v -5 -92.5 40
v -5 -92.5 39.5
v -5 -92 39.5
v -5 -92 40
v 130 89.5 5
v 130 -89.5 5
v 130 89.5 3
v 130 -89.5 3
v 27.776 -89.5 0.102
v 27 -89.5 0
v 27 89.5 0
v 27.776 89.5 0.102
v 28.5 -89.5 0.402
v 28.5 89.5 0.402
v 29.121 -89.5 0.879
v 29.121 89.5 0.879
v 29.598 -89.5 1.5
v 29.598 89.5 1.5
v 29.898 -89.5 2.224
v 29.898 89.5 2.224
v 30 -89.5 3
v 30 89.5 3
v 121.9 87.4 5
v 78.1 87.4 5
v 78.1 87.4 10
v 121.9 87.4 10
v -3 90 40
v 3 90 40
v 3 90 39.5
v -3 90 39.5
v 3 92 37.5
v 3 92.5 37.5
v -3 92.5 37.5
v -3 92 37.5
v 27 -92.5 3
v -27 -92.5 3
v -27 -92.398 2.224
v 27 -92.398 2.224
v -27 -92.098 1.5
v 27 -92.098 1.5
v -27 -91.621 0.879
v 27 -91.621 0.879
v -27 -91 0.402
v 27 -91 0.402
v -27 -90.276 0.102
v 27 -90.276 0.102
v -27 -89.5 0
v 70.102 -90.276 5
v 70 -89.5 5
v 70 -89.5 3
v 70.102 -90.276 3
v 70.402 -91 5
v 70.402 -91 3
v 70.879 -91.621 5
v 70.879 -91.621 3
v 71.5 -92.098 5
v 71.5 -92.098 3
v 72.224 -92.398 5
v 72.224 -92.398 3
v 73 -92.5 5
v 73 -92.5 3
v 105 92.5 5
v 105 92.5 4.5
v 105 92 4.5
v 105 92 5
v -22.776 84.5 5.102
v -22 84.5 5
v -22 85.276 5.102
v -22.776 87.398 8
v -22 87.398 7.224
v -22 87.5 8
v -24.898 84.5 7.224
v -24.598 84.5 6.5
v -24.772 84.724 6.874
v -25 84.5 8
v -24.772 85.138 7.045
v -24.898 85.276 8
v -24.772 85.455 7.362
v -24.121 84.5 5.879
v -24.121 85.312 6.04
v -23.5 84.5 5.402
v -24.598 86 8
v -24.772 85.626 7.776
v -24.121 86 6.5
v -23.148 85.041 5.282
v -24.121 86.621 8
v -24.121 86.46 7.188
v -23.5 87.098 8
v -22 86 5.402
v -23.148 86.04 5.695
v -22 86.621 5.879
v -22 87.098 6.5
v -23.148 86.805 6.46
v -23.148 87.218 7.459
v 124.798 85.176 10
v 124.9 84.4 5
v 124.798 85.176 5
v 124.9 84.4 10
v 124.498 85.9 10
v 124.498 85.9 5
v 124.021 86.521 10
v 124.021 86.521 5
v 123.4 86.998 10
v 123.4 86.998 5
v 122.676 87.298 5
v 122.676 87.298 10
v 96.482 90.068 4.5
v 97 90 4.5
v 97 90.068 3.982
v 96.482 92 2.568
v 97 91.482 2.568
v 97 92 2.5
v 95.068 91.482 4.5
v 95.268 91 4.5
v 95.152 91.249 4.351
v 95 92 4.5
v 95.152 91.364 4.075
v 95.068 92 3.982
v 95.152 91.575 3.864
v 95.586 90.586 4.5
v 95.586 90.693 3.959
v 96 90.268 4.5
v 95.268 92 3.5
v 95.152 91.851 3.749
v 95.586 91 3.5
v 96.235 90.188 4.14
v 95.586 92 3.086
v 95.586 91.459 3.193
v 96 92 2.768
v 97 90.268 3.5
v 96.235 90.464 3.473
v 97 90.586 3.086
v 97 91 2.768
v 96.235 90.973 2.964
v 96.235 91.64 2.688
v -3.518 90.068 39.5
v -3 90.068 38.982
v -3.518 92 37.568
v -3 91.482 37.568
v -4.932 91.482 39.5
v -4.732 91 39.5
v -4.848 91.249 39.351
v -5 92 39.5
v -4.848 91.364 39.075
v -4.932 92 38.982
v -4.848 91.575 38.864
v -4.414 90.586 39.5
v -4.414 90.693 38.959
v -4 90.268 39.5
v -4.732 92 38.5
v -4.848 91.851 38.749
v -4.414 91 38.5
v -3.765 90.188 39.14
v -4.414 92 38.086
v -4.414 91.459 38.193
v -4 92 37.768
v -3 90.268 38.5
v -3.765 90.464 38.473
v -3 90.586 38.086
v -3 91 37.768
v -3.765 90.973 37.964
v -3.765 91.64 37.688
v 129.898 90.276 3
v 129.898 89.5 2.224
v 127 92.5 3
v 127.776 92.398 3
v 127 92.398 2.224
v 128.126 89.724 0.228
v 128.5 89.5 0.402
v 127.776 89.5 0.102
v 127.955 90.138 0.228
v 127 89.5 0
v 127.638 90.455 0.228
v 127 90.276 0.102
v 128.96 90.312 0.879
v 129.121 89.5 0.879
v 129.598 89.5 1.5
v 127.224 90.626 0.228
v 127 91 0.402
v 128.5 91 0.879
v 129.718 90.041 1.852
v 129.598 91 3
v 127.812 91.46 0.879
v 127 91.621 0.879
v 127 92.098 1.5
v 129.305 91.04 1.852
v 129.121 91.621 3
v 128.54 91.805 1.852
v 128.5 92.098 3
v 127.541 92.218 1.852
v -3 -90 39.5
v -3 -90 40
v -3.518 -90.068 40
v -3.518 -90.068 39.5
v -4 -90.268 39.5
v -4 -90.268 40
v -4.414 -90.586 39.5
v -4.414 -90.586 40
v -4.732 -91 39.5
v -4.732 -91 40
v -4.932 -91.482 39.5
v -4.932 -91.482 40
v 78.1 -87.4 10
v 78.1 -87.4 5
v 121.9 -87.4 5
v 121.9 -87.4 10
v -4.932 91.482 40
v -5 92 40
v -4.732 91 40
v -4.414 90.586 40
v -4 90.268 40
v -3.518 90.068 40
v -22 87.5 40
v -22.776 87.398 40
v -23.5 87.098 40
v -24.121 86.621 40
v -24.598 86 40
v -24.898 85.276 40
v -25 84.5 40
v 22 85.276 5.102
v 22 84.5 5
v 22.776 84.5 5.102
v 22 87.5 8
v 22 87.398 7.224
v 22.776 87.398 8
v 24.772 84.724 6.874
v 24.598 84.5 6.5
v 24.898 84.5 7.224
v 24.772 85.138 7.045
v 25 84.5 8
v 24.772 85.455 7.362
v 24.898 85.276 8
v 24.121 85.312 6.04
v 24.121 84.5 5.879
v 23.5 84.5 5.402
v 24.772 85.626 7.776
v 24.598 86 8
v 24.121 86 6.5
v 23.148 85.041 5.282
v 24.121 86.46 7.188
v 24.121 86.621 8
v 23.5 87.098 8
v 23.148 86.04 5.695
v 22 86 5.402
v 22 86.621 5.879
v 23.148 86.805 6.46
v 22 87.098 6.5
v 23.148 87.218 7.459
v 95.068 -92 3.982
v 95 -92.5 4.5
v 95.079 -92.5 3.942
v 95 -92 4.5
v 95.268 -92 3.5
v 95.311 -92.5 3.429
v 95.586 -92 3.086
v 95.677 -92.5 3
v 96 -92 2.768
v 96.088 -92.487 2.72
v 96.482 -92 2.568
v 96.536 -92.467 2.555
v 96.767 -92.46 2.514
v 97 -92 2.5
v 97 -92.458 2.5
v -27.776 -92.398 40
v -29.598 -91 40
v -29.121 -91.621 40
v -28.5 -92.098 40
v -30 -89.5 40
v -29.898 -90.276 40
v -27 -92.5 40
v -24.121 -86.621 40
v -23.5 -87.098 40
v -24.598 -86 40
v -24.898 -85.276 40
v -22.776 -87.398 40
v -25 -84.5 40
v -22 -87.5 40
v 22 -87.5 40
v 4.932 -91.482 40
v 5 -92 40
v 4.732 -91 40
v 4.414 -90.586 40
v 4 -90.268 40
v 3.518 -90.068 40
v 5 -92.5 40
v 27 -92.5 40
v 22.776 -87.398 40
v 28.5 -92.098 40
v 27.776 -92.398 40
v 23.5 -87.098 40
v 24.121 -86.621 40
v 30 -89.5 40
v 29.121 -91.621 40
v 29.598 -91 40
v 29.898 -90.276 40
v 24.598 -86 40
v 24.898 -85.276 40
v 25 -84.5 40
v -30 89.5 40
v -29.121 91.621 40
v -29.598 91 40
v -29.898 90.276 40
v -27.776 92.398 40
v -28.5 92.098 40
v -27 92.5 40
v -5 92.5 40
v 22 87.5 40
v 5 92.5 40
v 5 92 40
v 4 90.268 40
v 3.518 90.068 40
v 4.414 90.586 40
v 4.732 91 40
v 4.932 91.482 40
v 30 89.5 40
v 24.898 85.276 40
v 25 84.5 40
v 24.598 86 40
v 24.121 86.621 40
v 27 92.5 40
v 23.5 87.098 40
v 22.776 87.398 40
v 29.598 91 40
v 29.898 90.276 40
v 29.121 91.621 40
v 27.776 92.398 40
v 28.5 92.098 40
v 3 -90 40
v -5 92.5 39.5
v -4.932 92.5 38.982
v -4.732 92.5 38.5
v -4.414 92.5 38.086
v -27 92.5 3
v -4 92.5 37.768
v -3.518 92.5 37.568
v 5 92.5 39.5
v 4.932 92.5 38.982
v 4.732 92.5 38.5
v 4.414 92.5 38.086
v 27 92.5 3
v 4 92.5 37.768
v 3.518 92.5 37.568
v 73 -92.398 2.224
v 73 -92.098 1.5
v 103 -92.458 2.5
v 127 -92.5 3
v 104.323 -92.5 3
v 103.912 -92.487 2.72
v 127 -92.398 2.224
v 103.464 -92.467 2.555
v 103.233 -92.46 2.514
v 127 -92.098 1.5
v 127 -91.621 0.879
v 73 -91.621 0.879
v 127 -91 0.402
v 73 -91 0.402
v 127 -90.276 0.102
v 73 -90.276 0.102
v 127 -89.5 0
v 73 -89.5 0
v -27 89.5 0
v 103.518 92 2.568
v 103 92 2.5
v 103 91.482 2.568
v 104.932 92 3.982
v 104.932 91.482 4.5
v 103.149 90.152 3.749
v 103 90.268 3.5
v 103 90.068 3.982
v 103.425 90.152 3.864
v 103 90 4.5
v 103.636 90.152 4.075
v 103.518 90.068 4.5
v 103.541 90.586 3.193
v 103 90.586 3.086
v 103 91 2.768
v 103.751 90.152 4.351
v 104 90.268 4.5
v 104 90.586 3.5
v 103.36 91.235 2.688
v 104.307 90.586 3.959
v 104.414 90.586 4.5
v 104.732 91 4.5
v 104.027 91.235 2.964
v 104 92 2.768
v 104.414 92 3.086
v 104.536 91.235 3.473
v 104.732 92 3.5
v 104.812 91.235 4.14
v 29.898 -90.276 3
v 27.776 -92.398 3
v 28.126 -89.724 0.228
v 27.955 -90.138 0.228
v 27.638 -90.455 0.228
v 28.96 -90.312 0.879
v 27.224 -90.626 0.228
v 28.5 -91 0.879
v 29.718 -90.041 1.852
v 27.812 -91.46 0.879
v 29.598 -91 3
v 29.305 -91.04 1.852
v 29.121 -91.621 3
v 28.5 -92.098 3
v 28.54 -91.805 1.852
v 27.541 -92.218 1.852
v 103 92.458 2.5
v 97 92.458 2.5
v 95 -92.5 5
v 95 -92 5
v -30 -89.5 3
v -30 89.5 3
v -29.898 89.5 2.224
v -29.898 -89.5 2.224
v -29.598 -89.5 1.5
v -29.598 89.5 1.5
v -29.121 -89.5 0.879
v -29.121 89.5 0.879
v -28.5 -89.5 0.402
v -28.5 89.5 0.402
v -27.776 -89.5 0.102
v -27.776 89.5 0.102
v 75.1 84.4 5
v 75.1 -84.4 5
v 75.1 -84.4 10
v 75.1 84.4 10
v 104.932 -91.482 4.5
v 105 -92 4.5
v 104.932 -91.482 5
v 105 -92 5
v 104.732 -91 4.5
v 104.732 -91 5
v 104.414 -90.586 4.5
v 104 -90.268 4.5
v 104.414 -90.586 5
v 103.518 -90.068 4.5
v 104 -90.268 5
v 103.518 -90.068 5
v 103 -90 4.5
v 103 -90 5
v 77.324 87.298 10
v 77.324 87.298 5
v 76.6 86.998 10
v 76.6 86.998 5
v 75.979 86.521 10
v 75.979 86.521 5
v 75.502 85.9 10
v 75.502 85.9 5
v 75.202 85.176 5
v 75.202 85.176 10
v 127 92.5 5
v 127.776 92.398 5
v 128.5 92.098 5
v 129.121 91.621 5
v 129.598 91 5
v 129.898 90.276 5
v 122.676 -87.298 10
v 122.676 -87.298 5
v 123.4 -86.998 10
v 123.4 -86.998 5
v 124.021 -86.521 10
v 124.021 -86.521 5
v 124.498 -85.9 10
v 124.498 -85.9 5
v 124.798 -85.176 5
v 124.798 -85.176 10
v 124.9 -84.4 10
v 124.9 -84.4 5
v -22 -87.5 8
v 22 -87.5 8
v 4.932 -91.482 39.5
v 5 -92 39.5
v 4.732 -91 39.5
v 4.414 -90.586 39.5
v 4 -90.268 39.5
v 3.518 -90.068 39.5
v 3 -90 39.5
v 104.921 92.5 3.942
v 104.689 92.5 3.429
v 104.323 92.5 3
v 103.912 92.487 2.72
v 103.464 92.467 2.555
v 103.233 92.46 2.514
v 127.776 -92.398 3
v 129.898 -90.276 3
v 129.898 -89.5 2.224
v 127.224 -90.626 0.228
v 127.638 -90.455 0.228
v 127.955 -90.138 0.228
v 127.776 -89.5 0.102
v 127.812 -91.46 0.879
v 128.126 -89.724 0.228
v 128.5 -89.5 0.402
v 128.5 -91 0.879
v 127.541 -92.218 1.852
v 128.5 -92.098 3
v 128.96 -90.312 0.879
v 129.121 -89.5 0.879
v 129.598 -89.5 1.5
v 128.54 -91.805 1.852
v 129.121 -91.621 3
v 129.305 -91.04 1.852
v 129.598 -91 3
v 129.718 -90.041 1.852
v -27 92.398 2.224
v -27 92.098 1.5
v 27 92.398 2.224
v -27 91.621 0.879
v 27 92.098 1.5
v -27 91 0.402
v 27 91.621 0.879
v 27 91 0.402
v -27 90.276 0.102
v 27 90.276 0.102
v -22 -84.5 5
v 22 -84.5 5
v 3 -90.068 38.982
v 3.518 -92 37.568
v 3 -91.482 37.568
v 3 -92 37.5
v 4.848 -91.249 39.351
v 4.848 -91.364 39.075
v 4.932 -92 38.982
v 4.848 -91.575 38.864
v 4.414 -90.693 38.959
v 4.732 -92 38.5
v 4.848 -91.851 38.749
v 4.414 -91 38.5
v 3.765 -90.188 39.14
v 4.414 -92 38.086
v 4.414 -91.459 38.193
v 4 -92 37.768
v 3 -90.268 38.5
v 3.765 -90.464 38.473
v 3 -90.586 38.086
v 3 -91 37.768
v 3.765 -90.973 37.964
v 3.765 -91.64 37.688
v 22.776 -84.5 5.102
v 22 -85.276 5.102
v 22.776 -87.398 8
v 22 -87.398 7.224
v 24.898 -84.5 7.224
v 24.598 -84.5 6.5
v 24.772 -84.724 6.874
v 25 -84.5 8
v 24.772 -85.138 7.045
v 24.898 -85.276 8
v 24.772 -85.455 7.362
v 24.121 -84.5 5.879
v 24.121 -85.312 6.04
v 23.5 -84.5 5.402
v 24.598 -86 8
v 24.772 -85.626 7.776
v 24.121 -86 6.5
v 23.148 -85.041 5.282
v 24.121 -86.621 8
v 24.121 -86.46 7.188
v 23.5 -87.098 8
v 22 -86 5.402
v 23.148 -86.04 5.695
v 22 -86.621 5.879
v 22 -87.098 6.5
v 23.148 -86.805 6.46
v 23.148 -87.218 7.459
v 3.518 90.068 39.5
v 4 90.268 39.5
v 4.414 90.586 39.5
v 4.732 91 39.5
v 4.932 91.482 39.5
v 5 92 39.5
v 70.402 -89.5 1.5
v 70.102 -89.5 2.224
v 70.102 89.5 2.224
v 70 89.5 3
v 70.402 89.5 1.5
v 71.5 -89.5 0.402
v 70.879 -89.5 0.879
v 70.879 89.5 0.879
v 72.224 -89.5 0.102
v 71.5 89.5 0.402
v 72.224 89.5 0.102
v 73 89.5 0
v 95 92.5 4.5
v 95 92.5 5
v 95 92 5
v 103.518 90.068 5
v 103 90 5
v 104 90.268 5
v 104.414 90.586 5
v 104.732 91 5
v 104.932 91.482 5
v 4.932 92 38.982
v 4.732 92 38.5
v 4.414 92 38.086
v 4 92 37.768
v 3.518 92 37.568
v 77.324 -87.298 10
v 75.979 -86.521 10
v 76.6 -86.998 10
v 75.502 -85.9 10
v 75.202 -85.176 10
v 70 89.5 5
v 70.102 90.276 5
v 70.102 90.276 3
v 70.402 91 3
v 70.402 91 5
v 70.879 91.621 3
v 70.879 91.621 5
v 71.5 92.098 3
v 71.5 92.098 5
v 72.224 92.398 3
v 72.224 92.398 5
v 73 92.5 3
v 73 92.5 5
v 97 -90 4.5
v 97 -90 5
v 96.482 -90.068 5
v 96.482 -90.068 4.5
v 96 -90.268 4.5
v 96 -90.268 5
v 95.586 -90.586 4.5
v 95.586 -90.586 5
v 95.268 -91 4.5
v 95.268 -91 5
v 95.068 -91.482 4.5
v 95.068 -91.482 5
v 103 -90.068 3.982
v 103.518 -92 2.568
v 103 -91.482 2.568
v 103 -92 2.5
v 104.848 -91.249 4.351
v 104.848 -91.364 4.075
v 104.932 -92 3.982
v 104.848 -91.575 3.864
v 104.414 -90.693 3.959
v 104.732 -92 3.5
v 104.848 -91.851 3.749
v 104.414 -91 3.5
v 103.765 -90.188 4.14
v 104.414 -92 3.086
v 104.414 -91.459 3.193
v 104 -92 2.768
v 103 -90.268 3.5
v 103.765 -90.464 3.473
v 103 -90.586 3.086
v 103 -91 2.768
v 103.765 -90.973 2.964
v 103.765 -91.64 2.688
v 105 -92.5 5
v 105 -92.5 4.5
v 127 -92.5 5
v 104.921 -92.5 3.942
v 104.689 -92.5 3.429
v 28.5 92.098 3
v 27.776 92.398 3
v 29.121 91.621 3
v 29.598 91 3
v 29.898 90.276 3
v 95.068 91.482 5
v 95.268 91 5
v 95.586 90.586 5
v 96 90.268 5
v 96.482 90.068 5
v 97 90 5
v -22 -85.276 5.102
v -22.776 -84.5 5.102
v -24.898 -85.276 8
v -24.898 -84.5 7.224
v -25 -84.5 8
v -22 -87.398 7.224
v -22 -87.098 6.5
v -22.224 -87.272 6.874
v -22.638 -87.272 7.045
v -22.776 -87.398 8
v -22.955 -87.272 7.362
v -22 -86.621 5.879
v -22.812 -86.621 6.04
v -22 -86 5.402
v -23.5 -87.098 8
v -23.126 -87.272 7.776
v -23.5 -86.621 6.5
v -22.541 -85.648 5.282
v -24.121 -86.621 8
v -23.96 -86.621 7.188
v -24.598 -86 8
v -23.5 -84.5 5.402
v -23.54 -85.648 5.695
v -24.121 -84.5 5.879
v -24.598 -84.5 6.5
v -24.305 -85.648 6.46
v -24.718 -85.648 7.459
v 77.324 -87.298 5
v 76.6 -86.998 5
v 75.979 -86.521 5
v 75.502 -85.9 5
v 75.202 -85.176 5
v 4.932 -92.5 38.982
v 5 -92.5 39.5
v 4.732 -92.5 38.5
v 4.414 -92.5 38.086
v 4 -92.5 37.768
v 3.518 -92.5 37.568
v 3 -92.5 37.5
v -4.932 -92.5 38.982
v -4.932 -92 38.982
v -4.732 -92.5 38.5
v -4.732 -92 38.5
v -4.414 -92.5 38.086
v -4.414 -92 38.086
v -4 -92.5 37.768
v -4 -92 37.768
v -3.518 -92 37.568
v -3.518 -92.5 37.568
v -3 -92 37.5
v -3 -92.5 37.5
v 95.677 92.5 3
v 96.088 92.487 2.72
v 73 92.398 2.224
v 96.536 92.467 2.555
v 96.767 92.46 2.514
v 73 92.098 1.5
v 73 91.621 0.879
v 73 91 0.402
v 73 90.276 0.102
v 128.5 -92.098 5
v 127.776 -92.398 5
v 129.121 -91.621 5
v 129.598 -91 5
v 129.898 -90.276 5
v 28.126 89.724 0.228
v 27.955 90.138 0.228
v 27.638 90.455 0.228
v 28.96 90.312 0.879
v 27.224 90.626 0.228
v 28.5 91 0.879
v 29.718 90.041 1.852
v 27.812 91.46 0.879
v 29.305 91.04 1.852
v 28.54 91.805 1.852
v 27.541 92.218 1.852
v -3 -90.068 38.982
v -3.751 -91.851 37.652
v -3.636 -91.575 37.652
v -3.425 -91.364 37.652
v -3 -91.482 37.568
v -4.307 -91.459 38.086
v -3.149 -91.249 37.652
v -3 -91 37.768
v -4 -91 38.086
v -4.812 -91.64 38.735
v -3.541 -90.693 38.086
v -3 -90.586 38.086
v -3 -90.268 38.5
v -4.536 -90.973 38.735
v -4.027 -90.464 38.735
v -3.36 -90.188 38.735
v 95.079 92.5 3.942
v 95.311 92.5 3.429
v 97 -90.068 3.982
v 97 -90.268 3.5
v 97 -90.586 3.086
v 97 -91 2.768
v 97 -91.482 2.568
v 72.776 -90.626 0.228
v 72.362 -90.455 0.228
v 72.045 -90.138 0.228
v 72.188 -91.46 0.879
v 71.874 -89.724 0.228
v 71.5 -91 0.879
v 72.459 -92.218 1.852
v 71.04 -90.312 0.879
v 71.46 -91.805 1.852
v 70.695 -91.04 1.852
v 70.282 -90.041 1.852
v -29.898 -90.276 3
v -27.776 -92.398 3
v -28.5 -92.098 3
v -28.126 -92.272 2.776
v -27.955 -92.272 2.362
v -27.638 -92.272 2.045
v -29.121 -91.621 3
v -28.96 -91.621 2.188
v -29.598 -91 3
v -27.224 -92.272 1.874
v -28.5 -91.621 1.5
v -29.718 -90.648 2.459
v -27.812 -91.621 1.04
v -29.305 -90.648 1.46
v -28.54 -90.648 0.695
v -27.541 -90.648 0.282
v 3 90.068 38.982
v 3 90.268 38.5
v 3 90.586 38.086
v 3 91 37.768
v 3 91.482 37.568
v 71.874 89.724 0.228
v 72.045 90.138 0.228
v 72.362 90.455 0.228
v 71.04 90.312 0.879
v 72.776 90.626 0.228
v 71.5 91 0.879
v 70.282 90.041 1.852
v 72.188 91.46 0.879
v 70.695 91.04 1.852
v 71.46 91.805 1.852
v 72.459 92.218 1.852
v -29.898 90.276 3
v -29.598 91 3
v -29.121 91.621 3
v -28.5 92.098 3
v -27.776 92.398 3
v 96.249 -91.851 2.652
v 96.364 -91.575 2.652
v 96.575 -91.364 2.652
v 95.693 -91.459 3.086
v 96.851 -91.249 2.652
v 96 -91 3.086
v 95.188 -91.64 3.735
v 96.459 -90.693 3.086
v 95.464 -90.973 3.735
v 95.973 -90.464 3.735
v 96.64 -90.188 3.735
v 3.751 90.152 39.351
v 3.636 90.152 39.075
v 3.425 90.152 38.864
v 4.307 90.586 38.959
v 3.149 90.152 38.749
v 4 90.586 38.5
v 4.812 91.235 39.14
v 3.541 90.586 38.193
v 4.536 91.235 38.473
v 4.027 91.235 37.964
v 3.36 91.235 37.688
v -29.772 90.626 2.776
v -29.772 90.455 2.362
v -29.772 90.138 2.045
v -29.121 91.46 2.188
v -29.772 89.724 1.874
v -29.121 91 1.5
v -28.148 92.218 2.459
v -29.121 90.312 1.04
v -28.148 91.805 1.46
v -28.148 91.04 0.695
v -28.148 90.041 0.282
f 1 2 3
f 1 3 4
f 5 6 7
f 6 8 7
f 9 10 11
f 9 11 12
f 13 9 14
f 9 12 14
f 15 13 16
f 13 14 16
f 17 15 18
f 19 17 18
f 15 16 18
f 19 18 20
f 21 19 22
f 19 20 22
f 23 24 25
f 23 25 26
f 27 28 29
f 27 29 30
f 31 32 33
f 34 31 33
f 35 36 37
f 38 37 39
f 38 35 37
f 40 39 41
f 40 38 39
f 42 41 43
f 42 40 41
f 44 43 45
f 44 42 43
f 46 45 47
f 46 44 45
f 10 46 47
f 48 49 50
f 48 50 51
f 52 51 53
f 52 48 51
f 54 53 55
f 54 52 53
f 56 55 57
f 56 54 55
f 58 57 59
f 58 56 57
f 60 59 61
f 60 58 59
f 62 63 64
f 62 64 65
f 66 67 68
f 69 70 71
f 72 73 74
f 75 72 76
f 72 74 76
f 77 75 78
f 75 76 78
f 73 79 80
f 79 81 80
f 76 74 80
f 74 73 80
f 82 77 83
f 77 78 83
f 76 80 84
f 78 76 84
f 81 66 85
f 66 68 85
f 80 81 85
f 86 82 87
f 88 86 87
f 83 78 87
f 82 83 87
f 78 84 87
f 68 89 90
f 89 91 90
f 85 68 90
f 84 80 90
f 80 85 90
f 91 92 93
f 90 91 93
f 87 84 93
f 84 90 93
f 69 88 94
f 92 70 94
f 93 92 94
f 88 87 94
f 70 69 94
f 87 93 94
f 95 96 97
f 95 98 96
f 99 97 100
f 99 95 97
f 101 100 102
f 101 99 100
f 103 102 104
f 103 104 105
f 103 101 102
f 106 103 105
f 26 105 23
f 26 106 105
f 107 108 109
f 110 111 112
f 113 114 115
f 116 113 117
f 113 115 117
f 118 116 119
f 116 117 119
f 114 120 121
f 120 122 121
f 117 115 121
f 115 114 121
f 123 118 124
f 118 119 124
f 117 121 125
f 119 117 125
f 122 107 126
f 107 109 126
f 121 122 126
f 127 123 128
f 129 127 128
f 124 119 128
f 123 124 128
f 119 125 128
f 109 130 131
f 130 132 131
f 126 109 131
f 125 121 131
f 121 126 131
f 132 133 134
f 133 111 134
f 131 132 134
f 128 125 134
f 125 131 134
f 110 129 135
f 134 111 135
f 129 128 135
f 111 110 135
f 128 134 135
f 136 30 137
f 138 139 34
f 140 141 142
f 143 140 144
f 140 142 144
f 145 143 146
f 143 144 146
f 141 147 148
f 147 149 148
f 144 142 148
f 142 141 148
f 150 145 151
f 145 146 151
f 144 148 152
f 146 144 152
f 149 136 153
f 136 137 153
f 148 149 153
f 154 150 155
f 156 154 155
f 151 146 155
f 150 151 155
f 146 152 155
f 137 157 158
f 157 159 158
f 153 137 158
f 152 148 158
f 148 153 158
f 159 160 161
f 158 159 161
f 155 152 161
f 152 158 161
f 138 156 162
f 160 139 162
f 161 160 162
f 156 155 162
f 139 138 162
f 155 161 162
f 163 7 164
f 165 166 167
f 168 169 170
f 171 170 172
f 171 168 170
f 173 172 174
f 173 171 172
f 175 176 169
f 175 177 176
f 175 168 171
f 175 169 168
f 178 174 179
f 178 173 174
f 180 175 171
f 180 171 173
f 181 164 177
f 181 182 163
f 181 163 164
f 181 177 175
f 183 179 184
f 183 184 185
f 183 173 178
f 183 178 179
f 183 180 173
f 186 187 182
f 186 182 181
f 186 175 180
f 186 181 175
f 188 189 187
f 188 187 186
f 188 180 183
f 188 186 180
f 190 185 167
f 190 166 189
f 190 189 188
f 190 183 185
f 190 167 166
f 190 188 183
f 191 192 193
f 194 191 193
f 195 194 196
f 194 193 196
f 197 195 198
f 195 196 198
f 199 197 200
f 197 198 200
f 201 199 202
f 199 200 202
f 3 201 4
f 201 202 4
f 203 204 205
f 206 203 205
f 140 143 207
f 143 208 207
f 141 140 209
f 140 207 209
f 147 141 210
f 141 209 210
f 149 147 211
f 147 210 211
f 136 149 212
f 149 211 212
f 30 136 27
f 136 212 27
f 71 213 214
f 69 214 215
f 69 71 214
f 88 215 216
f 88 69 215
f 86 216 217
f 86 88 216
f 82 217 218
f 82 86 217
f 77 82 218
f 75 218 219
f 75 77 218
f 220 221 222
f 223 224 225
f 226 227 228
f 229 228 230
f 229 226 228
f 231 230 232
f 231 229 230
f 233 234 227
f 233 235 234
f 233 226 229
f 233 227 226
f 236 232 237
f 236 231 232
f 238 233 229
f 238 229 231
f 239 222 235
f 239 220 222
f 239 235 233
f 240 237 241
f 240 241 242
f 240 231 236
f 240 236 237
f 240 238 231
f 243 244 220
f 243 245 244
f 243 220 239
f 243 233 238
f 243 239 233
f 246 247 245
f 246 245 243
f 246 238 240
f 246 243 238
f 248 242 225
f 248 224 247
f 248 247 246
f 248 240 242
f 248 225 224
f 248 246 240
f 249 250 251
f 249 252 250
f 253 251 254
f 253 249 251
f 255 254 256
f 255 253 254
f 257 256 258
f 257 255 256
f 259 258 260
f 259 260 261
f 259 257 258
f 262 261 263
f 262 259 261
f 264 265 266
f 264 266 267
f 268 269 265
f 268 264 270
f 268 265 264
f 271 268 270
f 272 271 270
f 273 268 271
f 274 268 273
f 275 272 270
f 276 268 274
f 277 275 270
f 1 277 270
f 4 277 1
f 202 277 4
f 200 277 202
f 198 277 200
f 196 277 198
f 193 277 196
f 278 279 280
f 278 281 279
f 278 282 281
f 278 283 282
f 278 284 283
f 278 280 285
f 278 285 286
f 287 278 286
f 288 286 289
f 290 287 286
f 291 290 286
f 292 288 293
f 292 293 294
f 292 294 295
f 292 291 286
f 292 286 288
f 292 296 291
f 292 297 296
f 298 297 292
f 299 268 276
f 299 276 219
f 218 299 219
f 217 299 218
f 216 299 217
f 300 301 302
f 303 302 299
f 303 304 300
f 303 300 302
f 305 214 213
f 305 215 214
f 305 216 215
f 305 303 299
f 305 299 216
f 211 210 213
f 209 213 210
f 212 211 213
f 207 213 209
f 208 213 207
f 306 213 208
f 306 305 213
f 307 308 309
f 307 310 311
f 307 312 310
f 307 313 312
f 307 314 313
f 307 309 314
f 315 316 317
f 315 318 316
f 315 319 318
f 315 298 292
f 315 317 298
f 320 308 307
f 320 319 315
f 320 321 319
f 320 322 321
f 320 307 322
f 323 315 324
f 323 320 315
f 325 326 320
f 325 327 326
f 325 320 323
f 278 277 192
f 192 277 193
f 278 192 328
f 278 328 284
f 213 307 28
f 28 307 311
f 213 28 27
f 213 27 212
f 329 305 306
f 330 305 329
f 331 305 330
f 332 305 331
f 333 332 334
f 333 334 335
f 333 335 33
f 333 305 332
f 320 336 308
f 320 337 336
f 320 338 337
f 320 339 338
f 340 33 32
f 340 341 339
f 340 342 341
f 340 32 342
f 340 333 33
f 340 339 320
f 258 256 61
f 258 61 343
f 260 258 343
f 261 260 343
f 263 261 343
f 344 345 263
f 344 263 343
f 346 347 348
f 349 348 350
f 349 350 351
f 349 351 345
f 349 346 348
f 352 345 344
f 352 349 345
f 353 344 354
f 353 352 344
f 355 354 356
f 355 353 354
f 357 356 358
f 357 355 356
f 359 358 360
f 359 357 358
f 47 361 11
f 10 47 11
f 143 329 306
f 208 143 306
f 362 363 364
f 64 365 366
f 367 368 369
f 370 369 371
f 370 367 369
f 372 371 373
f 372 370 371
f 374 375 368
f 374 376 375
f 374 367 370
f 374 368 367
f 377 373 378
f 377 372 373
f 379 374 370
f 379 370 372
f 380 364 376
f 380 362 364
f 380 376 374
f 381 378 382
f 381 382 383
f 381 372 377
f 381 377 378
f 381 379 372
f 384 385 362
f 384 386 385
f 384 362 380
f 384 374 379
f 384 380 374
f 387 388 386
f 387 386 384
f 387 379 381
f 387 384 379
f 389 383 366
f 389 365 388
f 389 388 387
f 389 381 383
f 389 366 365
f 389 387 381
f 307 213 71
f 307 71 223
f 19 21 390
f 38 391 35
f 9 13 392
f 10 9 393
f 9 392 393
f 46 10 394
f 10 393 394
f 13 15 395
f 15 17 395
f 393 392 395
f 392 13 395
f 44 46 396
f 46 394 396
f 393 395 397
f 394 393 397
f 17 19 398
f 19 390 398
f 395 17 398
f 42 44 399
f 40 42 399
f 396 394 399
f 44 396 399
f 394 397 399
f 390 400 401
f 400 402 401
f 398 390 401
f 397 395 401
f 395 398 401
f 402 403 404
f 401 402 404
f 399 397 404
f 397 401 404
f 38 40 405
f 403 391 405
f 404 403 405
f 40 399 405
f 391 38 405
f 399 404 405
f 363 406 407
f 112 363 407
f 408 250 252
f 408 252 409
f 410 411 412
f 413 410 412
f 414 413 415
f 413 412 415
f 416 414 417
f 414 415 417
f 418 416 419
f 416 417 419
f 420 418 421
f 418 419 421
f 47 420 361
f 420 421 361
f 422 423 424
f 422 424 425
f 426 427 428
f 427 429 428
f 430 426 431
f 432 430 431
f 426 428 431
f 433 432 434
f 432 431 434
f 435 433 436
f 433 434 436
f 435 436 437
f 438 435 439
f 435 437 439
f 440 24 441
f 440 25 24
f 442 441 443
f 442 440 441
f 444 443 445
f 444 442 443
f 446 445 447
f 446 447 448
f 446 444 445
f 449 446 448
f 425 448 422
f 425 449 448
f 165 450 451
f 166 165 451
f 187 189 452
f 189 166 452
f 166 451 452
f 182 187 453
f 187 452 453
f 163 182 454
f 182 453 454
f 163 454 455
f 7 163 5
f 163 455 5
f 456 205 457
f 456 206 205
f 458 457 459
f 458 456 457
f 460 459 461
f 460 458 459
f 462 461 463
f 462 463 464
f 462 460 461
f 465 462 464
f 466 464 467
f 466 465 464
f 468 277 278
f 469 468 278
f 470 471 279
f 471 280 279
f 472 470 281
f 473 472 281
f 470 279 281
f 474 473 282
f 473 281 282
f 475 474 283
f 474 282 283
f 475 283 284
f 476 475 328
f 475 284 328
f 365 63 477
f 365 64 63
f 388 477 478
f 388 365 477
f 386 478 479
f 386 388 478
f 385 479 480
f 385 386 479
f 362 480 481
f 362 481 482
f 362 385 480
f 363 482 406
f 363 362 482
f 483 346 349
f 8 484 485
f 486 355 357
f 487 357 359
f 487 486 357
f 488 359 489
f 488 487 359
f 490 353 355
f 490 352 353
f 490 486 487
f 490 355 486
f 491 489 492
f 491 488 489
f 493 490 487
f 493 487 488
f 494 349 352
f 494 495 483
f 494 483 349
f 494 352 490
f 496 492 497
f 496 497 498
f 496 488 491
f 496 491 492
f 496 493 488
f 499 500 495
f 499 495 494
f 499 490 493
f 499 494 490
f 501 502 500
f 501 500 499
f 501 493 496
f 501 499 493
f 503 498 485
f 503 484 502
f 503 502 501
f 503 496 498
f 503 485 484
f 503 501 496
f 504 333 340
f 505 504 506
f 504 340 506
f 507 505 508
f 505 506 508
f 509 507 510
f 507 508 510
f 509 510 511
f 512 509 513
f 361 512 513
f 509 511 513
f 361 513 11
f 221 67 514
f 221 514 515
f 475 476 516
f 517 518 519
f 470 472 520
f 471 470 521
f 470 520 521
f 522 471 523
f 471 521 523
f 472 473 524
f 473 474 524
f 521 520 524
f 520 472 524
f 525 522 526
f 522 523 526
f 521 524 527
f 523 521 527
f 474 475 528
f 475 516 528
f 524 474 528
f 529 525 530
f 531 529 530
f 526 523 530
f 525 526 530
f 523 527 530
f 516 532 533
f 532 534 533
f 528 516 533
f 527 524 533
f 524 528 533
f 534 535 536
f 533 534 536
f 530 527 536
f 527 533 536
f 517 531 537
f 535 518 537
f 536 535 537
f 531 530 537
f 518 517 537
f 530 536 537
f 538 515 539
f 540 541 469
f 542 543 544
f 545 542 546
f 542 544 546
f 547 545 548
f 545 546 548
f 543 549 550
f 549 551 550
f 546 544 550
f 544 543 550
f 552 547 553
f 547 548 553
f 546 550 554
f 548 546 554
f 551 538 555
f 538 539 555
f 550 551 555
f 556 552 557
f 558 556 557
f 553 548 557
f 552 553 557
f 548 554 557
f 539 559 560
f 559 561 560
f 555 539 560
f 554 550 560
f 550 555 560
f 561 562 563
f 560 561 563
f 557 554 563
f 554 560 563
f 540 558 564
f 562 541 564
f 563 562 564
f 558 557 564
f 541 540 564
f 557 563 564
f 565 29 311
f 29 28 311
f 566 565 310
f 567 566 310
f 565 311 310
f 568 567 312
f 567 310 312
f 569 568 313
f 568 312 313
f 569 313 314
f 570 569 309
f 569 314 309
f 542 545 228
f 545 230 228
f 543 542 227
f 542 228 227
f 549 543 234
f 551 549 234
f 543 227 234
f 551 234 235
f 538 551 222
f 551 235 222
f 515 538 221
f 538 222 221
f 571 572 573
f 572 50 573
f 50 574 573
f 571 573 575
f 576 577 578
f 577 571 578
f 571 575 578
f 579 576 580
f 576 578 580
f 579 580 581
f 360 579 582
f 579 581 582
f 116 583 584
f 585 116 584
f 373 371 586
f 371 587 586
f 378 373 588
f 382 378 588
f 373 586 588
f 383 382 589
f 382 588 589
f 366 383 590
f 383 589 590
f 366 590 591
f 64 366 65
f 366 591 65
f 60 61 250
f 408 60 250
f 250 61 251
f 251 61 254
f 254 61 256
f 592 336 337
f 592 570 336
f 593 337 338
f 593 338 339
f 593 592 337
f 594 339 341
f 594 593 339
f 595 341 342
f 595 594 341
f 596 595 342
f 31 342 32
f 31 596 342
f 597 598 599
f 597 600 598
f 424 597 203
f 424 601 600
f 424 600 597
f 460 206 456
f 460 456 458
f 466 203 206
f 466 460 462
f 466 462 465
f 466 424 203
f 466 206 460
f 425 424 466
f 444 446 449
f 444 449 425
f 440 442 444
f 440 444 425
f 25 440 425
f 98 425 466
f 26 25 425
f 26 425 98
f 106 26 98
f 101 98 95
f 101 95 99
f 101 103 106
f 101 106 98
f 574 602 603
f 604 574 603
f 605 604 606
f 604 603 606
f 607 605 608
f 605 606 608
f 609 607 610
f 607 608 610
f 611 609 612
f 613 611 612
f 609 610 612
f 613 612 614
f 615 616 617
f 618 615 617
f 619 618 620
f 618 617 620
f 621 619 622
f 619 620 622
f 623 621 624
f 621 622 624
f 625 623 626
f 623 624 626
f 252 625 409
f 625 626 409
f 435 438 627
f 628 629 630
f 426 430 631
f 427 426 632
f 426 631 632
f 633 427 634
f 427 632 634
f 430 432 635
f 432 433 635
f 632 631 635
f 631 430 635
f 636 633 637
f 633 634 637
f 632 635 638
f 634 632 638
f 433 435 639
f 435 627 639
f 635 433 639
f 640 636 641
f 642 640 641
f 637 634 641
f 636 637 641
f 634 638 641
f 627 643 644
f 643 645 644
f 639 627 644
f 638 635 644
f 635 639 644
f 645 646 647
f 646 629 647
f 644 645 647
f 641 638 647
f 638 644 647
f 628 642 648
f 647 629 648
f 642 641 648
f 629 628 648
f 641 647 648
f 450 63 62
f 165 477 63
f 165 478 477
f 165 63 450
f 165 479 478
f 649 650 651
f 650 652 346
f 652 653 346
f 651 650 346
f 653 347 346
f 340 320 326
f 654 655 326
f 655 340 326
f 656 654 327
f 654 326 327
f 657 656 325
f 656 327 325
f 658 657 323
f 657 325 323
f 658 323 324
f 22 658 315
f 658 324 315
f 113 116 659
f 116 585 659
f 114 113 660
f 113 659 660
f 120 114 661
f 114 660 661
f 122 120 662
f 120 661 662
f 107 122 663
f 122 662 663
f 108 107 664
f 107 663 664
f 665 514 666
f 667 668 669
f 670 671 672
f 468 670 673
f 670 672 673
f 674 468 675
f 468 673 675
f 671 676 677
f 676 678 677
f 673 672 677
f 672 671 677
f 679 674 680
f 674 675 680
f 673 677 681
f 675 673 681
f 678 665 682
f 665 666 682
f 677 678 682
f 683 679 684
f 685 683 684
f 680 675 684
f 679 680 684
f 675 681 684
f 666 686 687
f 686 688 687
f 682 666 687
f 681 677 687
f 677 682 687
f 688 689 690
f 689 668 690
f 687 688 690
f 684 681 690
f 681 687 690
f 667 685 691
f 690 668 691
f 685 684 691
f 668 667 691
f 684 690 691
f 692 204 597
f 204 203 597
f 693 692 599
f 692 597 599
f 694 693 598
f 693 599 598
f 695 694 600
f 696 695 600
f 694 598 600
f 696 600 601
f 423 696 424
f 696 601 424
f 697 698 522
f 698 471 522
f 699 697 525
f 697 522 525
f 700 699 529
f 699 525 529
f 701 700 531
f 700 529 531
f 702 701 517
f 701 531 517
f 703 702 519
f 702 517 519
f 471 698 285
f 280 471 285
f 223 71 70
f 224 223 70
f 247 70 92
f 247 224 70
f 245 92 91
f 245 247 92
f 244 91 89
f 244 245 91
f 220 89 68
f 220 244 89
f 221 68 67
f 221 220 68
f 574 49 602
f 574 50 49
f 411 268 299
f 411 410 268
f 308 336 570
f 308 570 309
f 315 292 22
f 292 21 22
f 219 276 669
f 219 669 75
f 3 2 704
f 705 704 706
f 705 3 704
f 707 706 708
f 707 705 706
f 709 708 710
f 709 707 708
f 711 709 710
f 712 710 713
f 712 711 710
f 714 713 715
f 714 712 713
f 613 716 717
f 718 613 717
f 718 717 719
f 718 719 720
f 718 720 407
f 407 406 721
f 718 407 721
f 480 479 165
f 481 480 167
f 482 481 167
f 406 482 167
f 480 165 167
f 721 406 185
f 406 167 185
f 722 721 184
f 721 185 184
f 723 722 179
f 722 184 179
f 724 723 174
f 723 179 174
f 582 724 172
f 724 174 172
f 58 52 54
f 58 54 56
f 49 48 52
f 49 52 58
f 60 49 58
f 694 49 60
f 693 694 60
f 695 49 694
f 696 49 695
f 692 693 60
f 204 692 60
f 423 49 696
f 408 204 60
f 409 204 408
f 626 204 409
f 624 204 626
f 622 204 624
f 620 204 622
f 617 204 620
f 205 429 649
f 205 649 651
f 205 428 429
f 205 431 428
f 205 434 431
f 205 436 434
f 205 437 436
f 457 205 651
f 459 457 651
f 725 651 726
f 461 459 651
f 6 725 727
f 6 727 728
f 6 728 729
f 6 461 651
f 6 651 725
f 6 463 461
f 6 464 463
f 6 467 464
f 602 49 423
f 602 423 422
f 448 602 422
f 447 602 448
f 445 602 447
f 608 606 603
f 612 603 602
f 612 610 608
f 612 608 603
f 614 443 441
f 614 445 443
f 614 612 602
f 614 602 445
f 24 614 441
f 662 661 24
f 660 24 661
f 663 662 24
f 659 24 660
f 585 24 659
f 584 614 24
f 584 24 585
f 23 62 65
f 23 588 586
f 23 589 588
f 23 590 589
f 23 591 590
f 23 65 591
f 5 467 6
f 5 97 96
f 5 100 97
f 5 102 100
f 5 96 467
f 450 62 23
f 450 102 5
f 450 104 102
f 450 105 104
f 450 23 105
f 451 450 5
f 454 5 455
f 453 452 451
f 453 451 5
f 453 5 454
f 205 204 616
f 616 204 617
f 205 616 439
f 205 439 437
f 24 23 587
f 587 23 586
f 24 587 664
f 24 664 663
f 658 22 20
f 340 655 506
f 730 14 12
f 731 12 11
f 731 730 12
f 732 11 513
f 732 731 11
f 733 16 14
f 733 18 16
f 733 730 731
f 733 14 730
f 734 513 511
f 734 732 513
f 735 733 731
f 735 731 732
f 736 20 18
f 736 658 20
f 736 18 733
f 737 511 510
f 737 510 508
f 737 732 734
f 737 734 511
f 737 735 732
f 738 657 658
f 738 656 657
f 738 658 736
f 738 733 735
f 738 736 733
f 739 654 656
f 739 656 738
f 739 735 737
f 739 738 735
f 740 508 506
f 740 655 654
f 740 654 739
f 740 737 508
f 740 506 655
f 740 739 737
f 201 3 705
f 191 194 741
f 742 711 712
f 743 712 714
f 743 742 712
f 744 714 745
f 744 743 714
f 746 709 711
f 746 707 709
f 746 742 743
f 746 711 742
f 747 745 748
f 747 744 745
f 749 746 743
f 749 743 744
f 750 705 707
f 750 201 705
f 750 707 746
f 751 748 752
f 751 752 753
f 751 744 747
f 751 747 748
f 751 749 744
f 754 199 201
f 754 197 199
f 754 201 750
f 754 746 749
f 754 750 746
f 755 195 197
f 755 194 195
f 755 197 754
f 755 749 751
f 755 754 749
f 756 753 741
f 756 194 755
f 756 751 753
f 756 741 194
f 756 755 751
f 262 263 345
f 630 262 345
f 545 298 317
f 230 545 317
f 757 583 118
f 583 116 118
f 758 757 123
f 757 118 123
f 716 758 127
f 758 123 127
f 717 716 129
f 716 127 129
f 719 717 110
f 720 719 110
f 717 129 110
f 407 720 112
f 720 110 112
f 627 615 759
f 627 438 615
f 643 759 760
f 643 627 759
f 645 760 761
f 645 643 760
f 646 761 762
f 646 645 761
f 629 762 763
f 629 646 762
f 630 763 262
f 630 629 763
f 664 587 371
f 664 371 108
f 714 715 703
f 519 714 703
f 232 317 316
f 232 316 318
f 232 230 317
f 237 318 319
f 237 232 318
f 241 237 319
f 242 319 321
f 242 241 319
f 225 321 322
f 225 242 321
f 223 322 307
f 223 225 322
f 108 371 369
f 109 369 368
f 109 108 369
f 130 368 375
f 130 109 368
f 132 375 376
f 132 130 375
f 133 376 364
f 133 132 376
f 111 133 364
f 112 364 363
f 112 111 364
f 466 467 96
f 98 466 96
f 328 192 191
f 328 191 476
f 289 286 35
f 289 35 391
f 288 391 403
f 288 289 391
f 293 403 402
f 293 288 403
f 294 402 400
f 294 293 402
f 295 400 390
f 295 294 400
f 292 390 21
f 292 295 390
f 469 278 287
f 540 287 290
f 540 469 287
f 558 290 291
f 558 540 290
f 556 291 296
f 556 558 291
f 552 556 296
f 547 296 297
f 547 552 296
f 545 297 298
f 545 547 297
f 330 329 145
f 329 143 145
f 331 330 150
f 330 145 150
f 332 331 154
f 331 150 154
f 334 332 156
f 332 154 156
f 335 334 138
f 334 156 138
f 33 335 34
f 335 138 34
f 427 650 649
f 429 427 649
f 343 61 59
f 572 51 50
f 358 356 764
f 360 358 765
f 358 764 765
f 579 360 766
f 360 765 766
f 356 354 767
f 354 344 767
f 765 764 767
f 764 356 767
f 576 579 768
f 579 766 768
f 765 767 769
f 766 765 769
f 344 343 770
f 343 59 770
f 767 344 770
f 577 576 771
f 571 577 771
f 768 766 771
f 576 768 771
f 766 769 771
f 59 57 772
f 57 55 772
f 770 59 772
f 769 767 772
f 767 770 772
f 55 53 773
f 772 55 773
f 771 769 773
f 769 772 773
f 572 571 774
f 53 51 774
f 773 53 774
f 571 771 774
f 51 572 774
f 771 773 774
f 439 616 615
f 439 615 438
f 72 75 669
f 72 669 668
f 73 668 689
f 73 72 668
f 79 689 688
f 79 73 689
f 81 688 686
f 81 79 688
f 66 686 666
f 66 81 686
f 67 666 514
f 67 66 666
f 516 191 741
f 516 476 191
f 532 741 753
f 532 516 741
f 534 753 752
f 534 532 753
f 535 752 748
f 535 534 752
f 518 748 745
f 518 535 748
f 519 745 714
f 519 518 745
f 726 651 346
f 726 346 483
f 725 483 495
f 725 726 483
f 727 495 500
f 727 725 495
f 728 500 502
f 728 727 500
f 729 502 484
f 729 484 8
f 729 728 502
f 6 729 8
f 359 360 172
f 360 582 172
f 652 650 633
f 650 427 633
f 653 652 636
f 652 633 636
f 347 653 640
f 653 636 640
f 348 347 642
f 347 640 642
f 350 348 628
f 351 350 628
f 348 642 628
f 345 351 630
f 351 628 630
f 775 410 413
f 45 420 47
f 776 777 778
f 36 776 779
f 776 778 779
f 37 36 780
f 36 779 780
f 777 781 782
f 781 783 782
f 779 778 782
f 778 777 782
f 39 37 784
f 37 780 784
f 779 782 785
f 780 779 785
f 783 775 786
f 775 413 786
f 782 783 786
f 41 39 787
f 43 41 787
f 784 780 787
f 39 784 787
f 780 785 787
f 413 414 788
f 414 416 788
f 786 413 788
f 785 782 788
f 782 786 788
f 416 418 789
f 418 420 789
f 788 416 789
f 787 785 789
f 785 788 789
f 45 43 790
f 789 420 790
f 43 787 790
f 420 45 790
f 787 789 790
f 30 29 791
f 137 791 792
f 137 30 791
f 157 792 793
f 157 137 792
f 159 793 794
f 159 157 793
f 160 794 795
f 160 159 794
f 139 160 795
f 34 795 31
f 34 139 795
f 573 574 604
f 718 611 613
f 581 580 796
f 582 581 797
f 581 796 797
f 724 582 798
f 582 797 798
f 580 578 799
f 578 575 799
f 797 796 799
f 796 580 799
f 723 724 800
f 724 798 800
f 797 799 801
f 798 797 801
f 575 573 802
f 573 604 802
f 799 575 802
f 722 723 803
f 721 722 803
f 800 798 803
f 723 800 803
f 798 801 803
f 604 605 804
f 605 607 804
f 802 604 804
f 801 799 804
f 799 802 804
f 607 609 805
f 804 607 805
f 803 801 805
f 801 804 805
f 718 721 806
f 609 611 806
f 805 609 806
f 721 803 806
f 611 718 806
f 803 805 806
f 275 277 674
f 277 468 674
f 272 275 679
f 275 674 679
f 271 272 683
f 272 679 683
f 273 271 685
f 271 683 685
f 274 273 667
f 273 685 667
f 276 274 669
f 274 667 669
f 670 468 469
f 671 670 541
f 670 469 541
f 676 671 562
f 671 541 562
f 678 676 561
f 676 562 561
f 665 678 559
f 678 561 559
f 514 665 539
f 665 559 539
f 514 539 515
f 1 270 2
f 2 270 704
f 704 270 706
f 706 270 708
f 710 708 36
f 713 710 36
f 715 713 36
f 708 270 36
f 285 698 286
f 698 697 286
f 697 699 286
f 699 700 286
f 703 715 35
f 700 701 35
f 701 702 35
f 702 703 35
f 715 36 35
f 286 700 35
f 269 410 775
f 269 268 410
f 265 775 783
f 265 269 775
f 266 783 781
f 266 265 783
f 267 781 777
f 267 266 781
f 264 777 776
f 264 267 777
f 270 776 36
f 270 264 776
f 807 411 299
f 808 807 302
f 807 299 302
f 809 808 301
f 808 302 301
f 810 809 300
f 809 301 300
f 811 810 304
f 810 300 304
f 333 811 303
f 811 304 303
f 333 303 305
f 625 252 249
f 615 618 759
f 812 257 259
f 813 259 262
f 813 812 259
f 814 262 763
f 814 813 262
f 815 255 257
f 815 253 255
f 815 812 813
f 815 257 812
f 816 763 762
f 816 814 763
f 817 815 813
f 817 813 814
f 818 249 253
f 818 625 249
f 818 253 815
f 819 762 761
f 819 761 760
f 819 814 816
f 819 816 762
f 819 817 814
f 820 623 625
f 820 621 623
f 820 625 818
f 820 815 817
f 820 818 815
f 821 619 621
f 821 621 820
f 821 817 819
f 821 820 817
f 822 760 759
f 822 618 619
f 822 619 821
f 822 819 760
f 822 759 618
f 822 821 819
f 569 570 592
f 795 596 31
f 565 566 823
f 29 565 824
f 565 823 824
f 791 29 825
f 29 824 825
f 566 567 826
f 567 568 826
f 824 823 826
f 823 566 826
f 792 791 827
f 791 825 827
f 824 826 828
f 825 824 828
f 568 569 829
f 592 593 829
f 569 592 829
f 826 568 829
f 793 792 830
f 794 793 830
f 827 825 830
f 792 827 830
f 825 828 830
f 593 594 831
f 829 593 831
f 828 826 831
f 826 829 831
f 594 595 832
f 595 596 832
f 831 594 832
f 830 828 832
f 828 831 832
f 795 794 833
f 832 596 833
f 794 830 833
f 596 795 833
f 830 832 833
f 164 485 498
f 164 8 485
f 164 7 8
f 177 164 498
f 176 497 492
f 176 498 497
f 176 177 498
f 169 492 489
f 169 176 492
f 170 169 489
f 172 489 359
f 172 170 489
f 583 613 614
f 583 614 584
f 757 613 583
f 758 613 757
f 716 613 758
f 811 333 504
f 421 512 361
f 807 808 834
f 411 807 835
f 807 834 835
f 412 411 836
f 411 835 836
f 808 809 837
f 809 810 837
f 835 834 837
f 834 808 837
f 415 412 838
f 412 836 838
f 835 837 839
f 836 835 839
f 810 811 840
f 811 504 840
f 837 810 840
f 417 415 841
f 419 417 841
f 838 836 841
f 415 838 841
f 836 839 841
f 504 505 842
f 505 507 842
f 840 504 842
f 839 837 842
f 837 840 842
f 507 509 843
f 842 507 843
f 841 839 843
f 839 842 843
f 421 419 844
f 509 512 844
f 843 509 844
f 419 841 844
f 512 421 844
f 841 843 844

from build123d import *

# Parameters (mm, degrees)
SKETCH001_W     = 60
SKETCH001_H     = 185
PAD_DEPTH       = 40
SKETCH_W        = 50
SKETCH_H        = 175
POCKET_DEPTH    = 35
FILLET_R        = 3
FILLET001_R     = 3
SKETCH002_W     = 10
SKETCH002_H     = 5
POCKET001_DEPTH = 2.5
FILLET002_R     = 2
SKETCH003_W     = 10
SKETCH003_H     = 5
POCKET002_DEPTH = 2.5
FILLET003_R     = 2
SKETCH004_W     = 60
SKETCH004_H     = 185
PAD001_DEPTH    = 5
SKETCH005_W     = 49.8
SKETCH005_H     = 174.8
PAD002_DEPTH    = 5
FILLET004_R     = 3
FILLET005_R     = 3
SKETCH006_W     = 10
SKETCH006_H     = 5
POCKET003_DEPTH = 2.5
FILLET006_R     = 2
SKETCH007_W     = 10
SKETCH007_H     = 5
POCKET004_DEPTH = 2.5
FILLET007_R     = 2


with BuildPart() as box:
    # Sketch001 → Pad (new body)
    with BuildSketch(Plane.XY):
        Rectangle(SKETCH001_W, SKETCH001_H)
    extrude(amount=PAD_DEPTH)

    # Sketch (on Face6 of Pad) → Pocket (cut)
    with BuildSketch(Plane.XY.offset(40)):
        Rectangle(SKETCH_W, SKETCH_H)
    extrude(amount=-POCKET_DEPTH, mode=Mode.SUBTRACT)

    # Fillet
    fillet_edges = [box.edges().sort_by_distance(p)[0] for p in [
        (30, -92.5, 20),
        (30, 92.5, 20),
        (30, 0, 0),
        (0, 92.5, 0),
        (-30, 92.5, 20),
        (-30, 0, 0),
        (-30, -92.5, 20),
        (0, -92.5, 0),
    ]]
    fillet(fillet_edges, radius=FILLET_R)

    # Fillet001
    fillet001_edges = [box.edges().sort_by_distance(p)[0] for p in [
        (0, 87.5, 5),
        (-25, 0, 5),
        (0, -87.5, 5),
        (25, 0, 5),
        (-25, 87.5, 22.5),
        (25, 87.5, 22.5),
        (-25, -87.5, 22.5),
        (25, -87.5, 22.5),
    ]]
    fillet(fillet001_edges, radius=FILLET001_R)

    # Sketch002 (on Face14 of Fillet001) → Pocket001 (cut)
    with BuildSketch(Plane.XZ.offset(92.5)):
        with Locations((0, 40)):
            Rectangle(SKETCH002_W, SKETCH002_H)
    extrude(amount=-POCKET001_DEPTH, mode=Mode.SUBTRACT)

    # Fillet002
    fillet002_edges = [box.edges().sort_by_distance(p)[0] for p in [
        (-5, -90, 38.75),
        (-5, -91.25, 37.5),
        (0, -90, 37.5),
        (5, -90, 38.75),
        (5, -91.25, 37.5),
    ]]
    fillet(fillet002_edges, radius=FILLET002_R)

    # Sketch003 (on Face11 of Fillet002) → Pocket002 (cut)
    with BuildSketch(Plane(origin=(0, 92.5, 0), x_dir=(-1, 0, 0), z_dir=(0, 1, 0))):
        with Locations((0, 40)):
            Rectangle(SKETCH003_W, SKETCH003_H)
    extrude(amount=-POCKET002_DEPTH, mode=Mode.SUBTRACT)

    # Fillet003
    fillet003_edges = [box.edges().sort_by_distance(p)[0] for p in [
        (5, 91.25, 37.5),
        (5, 90, 38.75),
        (0, 90, 37.5),
        (-5, 90, 38.75),
        (-5, 91.25, 37.5),
    ]]
    fillet(fillet003_edges, radius=FILLET003_R)


with BuildPart() as lid:
    # Sketch004 → Pad001 (new body)
    with BuildSketch(Plane.XY):
        with Locations((100, 0)):
            Rectangle(SKETCH004_W, SKETCH004_H)
    extrude(amount=PAD001_DEPTH)

    # Sketch005 (on Face6 of Pad001) → Pad002 (join)
    with BuildSketch(Plane.XY.offset(5)):
        with Locations((100, 0)):
            Rectangle(SKETCH005_W, SKETCH005_H)
    extrude(amount=PAD002_DEPTH)

    # Fillet004
    fillet004_edges = [lid.edges().sort_by_distance(p)[0] for p in [
        (75.1, -87.4, 7.5),
        (124.9, -87.4, 7.5),
        (124.9, 87.4, 7.5),
        (75.1, 87.4, 7.5),
    ]]
    fillet(fillet004_edges, radius=FILLET004_R)

    # Fillet005
    fillet005_edges = [lid.edges().sort_by_distance(p)[0] for p in [
        (130, 92.5, 2.5),
        (70, 92.5, 2.5),
        (70, -92.5, 2.5),
        (130, -92.5, 2.5),
        (100, -92.5, 0),
        (70, 0, 0),
        (130, 0, 0),
        (100, 92.5, 0),
    ]]
    fillet(fillet005_edges, radius=FILLET005_R)

    # Sketch006 (on Face5 of Fillet005) → Pocket003 (cut)
    with BuildSketch(Plane(origin=(0, 92.5, 0), x_dir=(-1, 0, 0), z_dir=(0, 1, 0))):
        with Locations((-100, 5)):
            Rectangle(SKETCH006_W, SKETCH006_H)
    extrude(amount=-POCKET003_DEPTH, mode=Mode.SUBTRACT)

    # Fillet006
    fillet006_edges = [lid.edges().sort_by_distance(p)[0] for p in [
        (105, 91.22902, 2.5),
        (100, 90, 2.5),
        (105, 90, 3.75),
        (95, 90, 3.75),
        (95, 91.22902, 2.5),
    ]]
    fillet(fillet006_edges, radius=FILLET006_R)

    # Sketch007 (on Face12 of Fillet006) → Pocket004 (cut)
    with BuildSketch(Plane.XZ.offset(92.5)):
        with Locations((100, 5)):
            Rectangle(SKETCH007_W, SKETCH007_H)
    extrude(amount=-POCKET004_DEPTH, mode=Mode.SUBTRACT)

    # Fillet007
    fillet007_edges = [lid.edges().sort_by_distance(p)[0] for p in [
        (95, -90, 3.75),
        (95, -91.22902, 2.5),
        (100, -90, 2.5),
        (105, -90, 3.75),
        (105, -91.22902, 2.5),
    ]]
    fillet(fillet007_edges, radius=FILLET007_R)


solid = Compound([box.part, lid.part])
